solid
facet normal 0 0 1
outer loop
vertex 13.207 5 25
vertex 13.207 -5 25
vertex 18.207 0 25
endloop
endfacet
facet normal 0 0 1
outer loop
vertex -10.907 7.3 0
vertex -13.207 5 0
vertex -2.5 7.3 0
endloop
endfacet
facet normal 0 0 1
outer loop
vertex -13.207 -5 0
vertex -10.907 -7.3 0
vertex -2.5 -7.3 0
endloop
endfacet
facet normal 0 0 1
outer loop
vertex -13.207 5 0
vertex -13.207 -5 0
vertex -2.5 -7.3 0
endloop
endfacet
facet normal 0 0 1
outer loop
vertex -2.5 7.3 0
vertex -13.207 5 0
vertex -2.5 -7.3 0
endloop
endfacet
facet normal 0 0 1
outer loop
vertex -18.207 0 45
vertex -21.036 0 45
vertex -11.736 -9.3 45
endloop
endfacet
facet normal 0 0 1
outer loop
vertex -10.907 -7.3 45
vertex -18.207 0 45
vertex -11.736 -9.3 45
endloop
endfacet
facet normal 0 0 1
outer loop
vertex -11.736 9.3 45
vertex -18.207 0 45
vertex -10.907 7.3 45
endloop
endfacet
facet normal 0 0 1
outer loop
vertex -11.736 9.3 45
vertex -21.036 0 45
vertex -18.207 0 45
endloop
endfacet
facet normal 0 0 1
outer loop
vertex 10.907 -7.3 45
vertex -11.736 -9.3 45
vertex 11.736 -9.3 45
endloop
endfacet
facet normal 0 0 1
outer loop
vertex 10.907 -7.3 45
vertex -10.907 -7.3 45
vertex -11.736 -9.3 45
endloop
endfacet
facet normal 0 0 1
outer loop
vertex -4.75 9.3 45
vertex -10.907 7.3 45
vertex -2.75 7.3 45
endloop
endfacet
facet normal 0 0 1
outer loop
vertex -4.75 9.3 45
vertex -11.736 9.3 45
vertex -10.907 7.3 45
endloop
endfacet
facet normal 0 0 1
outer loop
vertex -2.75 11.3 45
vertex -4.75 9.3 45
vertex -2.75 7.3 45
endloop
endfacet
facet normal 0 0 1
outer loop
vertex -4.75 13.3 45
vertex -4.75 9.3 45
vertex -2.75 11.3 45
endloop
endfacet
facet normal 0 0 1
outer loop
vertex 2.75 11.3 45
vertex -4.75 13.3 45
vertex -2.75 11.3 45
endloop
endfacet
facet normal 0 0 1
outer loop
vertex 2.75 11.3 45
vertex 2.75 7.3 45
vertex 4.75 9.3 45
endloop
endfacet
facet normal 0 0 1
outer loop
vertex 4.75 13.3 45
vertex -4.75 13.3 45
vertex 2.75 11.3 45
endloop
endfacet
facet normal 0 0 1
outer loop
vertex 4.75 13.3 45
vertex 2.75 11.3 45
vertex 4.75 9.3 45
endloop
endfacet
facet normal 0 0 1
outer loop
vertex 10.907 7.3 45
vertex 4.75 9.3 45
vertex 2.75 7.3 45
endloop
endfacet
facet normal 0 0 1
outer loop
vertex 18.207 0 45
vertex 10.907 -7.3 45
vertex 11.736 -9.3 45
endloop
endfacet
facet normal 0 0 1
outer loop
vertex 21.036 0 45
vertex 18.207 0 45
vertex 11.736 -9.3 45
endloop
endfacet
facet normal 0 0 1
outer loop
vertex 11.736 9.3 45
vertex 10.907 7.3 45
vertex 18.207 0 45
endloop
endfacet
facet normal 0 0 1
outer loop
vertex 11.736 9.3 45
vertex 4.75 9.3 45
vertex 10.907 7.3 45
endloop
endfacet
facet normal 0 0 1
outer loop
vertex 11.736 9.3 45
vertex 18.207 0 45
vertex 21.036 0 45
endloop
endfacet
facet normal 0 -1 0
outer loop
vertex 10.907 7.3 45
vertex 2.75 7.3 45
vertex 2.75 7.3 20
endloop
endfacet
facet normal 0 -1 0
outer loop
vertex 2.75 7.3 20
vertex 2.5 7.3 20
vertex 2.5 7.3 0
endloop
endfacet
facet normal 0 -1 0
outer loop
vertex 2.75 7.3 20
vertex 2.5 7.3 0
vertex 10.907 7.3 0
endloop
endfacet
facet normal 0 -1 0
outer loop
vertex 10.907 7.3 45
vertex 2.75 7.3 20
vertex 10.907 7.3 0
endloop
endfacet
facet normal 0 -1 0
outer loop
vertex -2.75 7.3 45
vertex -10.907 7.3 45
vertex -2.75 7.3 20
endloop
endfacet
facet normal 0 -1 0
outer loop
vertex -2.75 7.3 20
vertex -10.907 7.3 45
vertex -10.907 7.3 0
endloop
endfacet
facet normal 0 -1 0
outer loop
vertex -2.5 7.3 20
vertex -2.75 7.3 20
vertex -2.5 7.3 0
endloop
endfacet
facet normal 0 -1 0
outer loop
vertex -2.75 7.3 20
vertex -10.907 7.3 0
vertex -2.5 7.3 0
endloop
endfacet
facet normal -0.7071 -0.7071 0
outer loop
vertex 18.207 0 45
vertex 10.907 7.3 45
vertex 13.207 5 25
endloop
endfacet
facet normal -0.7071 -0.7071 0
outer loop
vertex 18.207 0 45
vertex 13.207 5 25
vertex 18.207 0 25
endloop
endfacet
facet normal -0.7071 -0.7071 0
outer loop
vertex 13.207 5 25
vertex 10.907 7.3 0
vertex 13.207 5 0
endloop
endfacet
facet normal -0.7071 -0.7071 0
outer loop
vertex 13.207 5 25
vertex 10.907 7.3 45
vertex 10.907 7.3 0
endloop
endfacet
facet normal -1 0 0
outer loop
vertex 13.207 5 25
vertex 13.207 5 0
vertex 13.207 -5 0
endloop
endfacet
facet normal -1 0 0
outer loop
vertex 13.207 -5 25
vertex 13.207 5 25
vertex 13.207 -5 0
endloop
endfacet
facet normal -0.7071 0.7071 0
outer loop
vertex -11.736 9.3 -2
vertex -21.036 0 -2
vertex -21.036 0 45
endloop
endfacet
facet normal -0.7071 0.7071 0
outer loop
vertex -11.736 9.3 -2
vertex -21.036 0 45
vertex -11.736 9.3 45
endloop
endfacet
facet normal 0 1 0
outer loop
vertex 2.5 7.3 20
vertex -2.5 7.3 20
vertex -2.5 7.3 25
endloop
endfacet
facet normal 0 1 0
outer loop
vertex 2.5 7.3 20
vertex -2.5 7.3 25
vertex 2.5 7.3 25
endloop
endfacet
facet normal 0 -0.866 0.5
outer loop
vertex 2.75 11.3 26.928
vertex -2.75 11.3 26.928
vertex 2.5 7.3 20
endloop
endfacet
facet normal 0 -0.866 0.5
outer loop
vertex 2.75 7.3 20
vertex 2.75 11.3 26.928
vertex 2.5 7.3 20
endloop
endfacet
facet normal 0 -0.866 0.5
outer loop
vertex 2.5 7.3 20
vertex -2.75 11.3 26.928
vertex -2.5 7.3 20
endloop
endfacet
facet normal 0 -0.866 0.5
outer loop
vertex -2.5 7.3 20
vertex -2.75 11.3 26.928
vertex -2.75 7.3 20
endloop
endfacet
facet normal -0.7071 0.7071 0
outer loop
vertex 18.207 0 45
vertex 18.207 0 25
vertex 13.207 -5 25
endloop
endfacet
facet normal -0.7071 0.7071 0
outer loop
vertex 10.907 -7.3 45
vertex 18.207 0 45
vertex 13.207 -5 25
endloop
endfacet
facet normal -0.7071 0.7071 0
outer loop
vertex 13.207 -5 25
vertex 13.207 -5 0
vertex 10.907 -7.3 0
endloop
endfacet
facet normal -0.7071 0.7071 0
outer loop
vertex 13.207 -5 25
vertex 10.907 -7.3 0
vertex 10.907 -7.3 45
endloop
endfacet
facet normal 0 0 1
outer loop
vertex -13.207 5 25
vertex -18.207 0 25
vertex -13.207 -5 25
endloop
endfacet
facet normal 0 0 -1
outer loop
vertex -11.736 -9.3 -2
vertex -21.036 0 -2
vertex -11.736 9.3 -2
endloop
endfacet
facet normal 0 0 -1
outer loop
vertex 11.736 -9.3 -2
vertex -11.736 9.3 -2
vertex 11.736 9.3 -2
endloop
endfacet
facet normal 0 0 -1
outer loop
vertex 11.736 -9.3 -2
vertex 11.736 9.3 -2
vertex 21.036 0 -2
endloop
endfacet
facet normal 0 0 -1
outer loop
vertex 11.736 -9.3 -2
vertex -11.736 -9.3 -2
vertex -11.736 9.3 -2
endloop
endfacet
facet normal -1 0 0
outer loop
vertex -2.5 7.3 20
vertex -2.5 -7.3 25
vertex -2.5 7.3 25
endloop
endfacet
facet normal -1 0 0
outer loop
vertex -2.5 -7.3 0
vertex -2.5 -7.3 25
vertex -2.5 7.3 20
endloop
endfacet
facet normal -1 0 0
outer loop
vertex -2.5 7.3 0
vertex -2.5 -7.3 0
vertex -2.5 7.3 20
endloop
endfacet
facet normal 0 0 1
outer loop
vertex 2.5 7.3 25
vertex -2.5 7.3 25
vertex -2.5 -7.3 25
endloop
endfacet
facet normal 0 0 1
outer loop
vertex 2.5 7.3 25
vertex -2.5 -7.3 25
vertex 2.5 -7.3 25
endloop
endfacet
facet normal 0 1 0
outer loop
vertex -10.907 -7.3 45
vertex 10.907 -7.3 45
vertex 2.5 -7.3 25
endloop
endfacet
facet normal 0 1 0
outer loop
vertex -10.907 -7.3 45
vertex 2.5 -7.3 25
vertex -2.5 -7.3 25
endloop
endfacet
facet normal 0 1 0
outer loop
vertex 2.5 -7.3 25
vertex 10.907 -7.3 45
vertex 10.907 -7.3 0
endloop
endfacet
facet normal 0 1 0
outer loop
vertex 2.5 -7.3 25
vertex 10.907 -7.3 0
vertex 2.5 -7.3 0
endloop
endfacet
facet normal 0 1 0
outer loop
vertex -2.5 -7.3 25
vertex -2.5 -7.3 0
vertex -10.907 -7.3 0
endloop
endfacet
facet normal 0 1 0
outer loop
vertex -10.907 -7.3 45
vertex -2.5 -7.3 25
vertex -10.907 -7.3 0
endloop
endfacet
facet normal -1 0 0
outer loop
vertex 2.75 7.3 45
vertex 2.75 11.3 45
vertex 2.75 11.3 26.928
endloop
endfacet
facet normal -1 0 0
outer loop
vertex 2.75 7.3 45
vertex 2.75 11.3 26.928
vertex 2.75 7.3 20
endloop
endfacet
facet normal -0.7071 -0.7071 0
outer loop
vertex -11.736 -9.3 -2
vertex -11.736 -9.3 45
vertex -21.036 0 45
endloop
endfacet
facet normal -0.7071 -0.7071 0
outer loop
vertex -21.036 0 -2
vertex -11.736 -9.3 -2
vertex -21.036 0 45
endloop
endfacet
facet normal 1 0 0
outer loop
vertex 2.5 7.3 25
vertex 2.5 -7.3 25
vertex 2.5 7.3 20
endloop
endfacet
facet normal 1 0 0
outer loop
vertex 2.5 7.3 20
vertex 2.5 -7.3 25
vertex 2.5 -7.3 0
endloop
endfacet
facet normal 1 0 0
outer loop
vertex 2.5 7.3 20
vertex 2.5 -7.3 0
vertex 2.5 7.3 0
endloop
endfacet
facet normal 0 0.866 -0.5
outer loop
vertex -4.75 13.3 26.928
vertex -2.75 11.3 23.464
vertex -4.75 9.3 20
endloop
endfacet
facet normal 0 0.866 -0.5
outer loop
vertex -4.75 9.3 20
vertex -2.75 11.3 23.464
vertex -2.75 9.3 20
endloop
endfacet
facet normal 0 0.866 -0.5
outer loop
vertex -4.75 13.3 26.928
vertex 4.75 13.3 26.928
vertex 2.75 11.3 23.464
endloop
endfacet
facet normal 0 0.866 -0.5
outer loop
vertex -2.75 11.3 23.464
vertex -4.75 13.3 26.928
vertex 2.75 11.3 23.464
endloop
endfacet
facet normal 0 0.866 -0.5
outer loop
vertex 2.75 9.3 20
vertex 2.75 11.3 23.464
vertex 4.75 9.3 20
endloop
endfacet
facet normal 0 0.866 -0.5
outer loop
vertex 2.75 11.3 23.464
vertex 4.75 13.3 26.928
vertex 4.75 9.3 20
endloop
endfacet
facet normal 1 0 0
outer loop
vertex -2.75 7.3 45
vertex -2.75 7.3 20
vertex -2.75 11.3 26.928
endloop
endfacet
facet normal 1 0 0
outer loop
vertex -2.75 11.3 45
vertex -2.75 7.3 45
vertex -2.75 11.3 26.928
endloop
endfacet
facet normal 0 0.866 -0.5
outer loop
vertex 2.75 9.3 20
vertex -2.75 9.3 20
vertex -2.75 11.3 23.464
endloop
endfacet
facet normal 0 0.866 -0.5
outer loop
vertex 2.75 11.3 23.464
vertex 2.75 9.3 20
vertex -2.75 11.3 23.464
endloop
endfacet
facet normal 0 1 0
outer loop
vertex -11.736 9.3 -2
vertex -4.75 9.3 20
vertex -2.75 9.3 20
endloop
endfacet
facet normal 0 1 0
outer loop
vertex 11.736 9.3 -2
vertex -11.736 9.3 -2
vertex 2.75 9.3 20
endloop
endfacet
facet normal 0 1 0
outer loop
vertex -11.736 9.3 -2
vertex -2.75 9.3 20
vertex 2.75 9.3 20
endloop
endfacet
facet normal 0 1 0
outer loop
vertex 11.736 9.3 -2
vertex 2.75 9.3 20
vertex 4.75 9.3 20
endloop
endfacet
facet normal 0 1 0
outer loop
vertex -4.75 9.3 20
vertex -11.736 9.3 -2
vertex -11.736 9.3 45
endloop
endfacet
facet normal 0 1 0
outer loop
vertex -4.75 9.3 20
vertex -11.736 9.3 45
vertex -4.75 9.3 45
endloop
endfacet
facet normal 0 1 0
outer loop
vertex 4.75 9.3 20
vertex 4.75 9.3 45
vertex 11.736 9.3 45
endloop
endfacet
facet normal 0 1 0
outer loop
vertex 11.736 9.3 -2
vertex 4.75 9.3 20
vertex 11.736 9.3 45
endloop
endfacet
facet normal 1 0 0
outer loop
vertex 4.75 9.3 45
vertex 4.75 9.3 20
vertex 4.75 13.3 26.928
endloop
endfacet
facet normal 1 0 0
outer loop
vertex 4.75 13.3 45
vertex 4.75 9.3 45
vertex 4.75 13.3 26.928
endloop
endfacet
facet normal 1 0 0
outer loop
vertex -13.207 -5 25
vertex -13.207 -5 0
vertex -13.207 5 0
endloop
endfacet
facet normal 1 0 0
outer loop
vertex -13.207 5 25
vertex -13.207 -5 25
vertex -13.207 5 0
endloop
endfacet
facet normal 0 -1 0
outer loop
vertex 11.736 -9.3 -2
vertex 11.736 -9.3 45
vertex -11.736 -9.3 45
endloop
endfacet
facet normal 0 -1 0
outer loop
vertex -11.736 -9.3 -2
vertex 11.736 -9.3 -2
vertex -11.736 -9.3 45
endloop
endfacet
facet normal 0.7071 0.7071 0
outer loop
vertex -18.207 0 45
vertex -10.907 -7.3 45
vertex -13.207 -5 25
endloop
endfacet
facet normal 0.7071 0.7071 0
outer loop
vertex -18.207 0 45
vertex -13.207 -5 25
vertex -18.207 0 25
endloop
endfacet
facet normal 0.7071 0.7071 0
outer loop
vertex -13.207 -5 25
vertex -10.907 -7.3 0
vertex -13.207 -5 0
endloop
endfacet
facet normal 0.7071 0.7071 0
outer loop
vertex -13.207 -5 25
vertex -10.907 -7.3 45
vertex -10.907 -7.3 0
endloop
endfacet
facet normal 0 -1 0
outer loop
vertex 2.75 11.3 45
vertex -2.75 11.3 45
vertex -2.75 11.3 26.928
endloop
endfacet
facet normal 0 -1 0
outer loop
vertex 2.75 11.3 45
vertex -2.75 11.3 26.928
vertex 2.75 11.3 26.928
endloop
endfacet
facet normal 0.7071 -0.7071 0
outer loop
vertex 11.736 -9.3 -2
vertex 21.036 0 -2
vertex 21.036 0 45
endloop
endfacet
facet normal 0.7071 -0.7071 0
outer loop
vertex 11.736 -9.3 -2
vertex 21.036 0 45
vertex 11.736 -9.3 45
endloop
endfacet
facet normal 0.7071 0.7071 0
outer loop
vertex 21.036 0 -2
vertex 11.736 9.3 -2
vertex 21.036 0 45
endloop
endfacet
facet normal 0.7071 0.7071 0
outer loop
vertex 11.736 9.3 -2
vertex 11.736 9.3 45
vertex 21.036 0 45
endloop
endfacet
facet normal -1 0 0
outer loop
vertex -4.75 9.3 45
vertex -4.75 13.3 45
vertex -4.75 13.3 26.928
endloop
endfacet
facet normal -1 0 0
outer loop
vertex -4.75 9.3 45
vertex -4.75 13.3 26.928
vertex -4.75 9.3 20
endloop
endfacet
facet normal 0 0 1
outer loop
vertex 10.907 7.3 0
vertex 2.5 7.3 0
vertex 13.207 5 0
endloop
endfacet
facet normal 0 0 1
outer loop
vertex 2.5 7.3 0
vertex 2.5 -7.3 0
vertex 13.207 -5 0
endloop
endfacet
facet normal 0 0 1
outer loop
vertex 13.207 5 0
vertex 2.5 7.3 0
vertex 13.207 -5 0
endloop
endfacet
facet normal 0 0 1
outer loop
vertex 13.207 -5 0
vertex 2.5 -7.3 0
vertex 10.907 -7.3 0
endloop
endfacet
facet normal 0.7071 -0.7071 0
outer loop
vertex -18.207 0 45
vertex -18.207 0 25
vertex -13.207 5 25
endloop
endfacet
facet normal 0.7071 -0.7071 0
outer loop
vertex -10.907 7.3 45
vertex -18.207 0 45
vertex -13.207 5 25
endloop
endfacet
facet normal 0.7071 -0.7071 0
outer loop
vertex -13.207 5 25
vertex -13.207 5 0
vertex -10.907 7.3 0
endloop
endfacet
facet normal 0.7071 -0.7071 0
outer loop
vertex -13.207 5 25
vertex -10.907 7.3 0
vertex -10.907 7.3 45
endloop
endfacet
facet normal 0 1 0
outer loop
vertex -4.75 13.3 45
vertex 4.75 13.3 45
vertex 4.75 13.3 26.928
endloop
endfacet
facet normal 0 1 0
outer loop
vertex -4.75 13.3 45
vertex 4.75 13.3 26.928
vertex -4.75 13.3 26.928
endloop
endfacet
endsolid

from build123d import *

# Parameters (mm, degrees)
F1_DEPTH  = 45
F2_W      = 5.5
F2_H      = 2
F3_DEPTH  = 25
F5_DEPTH  = 25
F7_DEPTH  = 25
F9_DEPTH  = 5.5
F11_DEPTH = 2
F12_W     = 5
F12_H     = 14.6
F13_DEPTH = 25


with BuildPart() as f1:
    # F0 (on Top) → F1 (new body)
    with BuildSketch(Plane.XY):
        Polygon((-11.7355339059, 9.3), (-21.0355339059, 0), (-11.7355339059, -9.3), (11.7355339059, -9.3), (21.0355339059, 0), (11.7355339059, 9.3), align=None)
        Polygon((10.9071067812, -7.3), (-10.9071067812, -7.3), (-18.2071067812, 0), (-10.9071067812, 7.3), (10.9071067812, 7.3), (18.2071067812, 0), align=None, mode=Mode.SUBTRACT)
    extrude(amount=F1_DEPTH)

    # F2 (on face) → F3 (cut)
    with BuildSketch(Plane.XY.offset(45)):
        with Locations((0, 8.3)):
            Rectangle(F2_W, F2_H)
    extrude(amount=-F3_DEPTH, mode=Mode.SUBTRACT)

    # F4 (on face) → F5 (join)
    with BuildSketch(Plane.XY.offset(45)):
        Polygon((2.75, 11.3), (2.75, 9.3), (4.75, 9.3), (4.75, 13.3), (-4.75, 13.3), (-4.75, 9.3), (-2.75, 9.3), (-2.75, 11.3), align=None)
    extrude(amount=-F5_DEPTH)

    # F6 (on face) → F7 (cut)
    with BuildSketch(Plane.YZ.offset(4.75)):
        Polygon((13.3, 26.9282032303), (9.3, 20), (13.3, 20), align=None)
    extrude(amount=-F7_DEPTH, mode=Mode.SUBTRACT)

    # F8 (on face) → F9 (join, through all)
    with BuildSketch(Plane.YZ.offset(-2.75)):
        Polygon((7.3, 20), (9.3, 20), (11.3, 23.4641016151), (11.3, 26.9282032303), align=None)
    extrude(amount=F9_DEPTH)

    # F10 (on face) → F11 (join)
    with BuildSketch(Plane(origin=(0, 0, 0), x_dir=(1, 0, 0), z_dir=(0, 0, -1))):
        Polygon((-11.7355339059, 9.3), (-21.0355339059, 0), (-11.7355339059, -9.3), (11.7355339059, -9.3), (21.0355339059, 0), (11.7355339059, 9.3), align=None)
        Polygon((-18.2071067812, 0), (-10.9071067812, 7.3), (10.9071067812, 7.3), (18.2071067812, 0), (10.9071067812, -7.3), (-10.9071067812, -7.3), align=None, mode=Mode.SUBTRACT)
        Polygon((10.9071067812, 7.3), (-10.9071067812, 7.3), (-18.2071067812, 0), (-10.9071067812, -7.3), (10.9071067812, -7.3), (18.2071067812, 0), align=None)
    extrude(amount=F11_DEPTH)

    # F12 (on face) → F13 (join)
    with BuildSketch(Plane.XY):
        Polygon((18.2071067812, 0), (13.2071067812, 5), (13.2071067812, -5), align=None)
        Polygon((-13.2071067812, -5), (-13.2071067812, 5), (-18.2071067812, 0), align=None)
        Rectangle(F12_W, F12_H)
    extrude(amount=F13_DEPTH)


solid = f1.part
